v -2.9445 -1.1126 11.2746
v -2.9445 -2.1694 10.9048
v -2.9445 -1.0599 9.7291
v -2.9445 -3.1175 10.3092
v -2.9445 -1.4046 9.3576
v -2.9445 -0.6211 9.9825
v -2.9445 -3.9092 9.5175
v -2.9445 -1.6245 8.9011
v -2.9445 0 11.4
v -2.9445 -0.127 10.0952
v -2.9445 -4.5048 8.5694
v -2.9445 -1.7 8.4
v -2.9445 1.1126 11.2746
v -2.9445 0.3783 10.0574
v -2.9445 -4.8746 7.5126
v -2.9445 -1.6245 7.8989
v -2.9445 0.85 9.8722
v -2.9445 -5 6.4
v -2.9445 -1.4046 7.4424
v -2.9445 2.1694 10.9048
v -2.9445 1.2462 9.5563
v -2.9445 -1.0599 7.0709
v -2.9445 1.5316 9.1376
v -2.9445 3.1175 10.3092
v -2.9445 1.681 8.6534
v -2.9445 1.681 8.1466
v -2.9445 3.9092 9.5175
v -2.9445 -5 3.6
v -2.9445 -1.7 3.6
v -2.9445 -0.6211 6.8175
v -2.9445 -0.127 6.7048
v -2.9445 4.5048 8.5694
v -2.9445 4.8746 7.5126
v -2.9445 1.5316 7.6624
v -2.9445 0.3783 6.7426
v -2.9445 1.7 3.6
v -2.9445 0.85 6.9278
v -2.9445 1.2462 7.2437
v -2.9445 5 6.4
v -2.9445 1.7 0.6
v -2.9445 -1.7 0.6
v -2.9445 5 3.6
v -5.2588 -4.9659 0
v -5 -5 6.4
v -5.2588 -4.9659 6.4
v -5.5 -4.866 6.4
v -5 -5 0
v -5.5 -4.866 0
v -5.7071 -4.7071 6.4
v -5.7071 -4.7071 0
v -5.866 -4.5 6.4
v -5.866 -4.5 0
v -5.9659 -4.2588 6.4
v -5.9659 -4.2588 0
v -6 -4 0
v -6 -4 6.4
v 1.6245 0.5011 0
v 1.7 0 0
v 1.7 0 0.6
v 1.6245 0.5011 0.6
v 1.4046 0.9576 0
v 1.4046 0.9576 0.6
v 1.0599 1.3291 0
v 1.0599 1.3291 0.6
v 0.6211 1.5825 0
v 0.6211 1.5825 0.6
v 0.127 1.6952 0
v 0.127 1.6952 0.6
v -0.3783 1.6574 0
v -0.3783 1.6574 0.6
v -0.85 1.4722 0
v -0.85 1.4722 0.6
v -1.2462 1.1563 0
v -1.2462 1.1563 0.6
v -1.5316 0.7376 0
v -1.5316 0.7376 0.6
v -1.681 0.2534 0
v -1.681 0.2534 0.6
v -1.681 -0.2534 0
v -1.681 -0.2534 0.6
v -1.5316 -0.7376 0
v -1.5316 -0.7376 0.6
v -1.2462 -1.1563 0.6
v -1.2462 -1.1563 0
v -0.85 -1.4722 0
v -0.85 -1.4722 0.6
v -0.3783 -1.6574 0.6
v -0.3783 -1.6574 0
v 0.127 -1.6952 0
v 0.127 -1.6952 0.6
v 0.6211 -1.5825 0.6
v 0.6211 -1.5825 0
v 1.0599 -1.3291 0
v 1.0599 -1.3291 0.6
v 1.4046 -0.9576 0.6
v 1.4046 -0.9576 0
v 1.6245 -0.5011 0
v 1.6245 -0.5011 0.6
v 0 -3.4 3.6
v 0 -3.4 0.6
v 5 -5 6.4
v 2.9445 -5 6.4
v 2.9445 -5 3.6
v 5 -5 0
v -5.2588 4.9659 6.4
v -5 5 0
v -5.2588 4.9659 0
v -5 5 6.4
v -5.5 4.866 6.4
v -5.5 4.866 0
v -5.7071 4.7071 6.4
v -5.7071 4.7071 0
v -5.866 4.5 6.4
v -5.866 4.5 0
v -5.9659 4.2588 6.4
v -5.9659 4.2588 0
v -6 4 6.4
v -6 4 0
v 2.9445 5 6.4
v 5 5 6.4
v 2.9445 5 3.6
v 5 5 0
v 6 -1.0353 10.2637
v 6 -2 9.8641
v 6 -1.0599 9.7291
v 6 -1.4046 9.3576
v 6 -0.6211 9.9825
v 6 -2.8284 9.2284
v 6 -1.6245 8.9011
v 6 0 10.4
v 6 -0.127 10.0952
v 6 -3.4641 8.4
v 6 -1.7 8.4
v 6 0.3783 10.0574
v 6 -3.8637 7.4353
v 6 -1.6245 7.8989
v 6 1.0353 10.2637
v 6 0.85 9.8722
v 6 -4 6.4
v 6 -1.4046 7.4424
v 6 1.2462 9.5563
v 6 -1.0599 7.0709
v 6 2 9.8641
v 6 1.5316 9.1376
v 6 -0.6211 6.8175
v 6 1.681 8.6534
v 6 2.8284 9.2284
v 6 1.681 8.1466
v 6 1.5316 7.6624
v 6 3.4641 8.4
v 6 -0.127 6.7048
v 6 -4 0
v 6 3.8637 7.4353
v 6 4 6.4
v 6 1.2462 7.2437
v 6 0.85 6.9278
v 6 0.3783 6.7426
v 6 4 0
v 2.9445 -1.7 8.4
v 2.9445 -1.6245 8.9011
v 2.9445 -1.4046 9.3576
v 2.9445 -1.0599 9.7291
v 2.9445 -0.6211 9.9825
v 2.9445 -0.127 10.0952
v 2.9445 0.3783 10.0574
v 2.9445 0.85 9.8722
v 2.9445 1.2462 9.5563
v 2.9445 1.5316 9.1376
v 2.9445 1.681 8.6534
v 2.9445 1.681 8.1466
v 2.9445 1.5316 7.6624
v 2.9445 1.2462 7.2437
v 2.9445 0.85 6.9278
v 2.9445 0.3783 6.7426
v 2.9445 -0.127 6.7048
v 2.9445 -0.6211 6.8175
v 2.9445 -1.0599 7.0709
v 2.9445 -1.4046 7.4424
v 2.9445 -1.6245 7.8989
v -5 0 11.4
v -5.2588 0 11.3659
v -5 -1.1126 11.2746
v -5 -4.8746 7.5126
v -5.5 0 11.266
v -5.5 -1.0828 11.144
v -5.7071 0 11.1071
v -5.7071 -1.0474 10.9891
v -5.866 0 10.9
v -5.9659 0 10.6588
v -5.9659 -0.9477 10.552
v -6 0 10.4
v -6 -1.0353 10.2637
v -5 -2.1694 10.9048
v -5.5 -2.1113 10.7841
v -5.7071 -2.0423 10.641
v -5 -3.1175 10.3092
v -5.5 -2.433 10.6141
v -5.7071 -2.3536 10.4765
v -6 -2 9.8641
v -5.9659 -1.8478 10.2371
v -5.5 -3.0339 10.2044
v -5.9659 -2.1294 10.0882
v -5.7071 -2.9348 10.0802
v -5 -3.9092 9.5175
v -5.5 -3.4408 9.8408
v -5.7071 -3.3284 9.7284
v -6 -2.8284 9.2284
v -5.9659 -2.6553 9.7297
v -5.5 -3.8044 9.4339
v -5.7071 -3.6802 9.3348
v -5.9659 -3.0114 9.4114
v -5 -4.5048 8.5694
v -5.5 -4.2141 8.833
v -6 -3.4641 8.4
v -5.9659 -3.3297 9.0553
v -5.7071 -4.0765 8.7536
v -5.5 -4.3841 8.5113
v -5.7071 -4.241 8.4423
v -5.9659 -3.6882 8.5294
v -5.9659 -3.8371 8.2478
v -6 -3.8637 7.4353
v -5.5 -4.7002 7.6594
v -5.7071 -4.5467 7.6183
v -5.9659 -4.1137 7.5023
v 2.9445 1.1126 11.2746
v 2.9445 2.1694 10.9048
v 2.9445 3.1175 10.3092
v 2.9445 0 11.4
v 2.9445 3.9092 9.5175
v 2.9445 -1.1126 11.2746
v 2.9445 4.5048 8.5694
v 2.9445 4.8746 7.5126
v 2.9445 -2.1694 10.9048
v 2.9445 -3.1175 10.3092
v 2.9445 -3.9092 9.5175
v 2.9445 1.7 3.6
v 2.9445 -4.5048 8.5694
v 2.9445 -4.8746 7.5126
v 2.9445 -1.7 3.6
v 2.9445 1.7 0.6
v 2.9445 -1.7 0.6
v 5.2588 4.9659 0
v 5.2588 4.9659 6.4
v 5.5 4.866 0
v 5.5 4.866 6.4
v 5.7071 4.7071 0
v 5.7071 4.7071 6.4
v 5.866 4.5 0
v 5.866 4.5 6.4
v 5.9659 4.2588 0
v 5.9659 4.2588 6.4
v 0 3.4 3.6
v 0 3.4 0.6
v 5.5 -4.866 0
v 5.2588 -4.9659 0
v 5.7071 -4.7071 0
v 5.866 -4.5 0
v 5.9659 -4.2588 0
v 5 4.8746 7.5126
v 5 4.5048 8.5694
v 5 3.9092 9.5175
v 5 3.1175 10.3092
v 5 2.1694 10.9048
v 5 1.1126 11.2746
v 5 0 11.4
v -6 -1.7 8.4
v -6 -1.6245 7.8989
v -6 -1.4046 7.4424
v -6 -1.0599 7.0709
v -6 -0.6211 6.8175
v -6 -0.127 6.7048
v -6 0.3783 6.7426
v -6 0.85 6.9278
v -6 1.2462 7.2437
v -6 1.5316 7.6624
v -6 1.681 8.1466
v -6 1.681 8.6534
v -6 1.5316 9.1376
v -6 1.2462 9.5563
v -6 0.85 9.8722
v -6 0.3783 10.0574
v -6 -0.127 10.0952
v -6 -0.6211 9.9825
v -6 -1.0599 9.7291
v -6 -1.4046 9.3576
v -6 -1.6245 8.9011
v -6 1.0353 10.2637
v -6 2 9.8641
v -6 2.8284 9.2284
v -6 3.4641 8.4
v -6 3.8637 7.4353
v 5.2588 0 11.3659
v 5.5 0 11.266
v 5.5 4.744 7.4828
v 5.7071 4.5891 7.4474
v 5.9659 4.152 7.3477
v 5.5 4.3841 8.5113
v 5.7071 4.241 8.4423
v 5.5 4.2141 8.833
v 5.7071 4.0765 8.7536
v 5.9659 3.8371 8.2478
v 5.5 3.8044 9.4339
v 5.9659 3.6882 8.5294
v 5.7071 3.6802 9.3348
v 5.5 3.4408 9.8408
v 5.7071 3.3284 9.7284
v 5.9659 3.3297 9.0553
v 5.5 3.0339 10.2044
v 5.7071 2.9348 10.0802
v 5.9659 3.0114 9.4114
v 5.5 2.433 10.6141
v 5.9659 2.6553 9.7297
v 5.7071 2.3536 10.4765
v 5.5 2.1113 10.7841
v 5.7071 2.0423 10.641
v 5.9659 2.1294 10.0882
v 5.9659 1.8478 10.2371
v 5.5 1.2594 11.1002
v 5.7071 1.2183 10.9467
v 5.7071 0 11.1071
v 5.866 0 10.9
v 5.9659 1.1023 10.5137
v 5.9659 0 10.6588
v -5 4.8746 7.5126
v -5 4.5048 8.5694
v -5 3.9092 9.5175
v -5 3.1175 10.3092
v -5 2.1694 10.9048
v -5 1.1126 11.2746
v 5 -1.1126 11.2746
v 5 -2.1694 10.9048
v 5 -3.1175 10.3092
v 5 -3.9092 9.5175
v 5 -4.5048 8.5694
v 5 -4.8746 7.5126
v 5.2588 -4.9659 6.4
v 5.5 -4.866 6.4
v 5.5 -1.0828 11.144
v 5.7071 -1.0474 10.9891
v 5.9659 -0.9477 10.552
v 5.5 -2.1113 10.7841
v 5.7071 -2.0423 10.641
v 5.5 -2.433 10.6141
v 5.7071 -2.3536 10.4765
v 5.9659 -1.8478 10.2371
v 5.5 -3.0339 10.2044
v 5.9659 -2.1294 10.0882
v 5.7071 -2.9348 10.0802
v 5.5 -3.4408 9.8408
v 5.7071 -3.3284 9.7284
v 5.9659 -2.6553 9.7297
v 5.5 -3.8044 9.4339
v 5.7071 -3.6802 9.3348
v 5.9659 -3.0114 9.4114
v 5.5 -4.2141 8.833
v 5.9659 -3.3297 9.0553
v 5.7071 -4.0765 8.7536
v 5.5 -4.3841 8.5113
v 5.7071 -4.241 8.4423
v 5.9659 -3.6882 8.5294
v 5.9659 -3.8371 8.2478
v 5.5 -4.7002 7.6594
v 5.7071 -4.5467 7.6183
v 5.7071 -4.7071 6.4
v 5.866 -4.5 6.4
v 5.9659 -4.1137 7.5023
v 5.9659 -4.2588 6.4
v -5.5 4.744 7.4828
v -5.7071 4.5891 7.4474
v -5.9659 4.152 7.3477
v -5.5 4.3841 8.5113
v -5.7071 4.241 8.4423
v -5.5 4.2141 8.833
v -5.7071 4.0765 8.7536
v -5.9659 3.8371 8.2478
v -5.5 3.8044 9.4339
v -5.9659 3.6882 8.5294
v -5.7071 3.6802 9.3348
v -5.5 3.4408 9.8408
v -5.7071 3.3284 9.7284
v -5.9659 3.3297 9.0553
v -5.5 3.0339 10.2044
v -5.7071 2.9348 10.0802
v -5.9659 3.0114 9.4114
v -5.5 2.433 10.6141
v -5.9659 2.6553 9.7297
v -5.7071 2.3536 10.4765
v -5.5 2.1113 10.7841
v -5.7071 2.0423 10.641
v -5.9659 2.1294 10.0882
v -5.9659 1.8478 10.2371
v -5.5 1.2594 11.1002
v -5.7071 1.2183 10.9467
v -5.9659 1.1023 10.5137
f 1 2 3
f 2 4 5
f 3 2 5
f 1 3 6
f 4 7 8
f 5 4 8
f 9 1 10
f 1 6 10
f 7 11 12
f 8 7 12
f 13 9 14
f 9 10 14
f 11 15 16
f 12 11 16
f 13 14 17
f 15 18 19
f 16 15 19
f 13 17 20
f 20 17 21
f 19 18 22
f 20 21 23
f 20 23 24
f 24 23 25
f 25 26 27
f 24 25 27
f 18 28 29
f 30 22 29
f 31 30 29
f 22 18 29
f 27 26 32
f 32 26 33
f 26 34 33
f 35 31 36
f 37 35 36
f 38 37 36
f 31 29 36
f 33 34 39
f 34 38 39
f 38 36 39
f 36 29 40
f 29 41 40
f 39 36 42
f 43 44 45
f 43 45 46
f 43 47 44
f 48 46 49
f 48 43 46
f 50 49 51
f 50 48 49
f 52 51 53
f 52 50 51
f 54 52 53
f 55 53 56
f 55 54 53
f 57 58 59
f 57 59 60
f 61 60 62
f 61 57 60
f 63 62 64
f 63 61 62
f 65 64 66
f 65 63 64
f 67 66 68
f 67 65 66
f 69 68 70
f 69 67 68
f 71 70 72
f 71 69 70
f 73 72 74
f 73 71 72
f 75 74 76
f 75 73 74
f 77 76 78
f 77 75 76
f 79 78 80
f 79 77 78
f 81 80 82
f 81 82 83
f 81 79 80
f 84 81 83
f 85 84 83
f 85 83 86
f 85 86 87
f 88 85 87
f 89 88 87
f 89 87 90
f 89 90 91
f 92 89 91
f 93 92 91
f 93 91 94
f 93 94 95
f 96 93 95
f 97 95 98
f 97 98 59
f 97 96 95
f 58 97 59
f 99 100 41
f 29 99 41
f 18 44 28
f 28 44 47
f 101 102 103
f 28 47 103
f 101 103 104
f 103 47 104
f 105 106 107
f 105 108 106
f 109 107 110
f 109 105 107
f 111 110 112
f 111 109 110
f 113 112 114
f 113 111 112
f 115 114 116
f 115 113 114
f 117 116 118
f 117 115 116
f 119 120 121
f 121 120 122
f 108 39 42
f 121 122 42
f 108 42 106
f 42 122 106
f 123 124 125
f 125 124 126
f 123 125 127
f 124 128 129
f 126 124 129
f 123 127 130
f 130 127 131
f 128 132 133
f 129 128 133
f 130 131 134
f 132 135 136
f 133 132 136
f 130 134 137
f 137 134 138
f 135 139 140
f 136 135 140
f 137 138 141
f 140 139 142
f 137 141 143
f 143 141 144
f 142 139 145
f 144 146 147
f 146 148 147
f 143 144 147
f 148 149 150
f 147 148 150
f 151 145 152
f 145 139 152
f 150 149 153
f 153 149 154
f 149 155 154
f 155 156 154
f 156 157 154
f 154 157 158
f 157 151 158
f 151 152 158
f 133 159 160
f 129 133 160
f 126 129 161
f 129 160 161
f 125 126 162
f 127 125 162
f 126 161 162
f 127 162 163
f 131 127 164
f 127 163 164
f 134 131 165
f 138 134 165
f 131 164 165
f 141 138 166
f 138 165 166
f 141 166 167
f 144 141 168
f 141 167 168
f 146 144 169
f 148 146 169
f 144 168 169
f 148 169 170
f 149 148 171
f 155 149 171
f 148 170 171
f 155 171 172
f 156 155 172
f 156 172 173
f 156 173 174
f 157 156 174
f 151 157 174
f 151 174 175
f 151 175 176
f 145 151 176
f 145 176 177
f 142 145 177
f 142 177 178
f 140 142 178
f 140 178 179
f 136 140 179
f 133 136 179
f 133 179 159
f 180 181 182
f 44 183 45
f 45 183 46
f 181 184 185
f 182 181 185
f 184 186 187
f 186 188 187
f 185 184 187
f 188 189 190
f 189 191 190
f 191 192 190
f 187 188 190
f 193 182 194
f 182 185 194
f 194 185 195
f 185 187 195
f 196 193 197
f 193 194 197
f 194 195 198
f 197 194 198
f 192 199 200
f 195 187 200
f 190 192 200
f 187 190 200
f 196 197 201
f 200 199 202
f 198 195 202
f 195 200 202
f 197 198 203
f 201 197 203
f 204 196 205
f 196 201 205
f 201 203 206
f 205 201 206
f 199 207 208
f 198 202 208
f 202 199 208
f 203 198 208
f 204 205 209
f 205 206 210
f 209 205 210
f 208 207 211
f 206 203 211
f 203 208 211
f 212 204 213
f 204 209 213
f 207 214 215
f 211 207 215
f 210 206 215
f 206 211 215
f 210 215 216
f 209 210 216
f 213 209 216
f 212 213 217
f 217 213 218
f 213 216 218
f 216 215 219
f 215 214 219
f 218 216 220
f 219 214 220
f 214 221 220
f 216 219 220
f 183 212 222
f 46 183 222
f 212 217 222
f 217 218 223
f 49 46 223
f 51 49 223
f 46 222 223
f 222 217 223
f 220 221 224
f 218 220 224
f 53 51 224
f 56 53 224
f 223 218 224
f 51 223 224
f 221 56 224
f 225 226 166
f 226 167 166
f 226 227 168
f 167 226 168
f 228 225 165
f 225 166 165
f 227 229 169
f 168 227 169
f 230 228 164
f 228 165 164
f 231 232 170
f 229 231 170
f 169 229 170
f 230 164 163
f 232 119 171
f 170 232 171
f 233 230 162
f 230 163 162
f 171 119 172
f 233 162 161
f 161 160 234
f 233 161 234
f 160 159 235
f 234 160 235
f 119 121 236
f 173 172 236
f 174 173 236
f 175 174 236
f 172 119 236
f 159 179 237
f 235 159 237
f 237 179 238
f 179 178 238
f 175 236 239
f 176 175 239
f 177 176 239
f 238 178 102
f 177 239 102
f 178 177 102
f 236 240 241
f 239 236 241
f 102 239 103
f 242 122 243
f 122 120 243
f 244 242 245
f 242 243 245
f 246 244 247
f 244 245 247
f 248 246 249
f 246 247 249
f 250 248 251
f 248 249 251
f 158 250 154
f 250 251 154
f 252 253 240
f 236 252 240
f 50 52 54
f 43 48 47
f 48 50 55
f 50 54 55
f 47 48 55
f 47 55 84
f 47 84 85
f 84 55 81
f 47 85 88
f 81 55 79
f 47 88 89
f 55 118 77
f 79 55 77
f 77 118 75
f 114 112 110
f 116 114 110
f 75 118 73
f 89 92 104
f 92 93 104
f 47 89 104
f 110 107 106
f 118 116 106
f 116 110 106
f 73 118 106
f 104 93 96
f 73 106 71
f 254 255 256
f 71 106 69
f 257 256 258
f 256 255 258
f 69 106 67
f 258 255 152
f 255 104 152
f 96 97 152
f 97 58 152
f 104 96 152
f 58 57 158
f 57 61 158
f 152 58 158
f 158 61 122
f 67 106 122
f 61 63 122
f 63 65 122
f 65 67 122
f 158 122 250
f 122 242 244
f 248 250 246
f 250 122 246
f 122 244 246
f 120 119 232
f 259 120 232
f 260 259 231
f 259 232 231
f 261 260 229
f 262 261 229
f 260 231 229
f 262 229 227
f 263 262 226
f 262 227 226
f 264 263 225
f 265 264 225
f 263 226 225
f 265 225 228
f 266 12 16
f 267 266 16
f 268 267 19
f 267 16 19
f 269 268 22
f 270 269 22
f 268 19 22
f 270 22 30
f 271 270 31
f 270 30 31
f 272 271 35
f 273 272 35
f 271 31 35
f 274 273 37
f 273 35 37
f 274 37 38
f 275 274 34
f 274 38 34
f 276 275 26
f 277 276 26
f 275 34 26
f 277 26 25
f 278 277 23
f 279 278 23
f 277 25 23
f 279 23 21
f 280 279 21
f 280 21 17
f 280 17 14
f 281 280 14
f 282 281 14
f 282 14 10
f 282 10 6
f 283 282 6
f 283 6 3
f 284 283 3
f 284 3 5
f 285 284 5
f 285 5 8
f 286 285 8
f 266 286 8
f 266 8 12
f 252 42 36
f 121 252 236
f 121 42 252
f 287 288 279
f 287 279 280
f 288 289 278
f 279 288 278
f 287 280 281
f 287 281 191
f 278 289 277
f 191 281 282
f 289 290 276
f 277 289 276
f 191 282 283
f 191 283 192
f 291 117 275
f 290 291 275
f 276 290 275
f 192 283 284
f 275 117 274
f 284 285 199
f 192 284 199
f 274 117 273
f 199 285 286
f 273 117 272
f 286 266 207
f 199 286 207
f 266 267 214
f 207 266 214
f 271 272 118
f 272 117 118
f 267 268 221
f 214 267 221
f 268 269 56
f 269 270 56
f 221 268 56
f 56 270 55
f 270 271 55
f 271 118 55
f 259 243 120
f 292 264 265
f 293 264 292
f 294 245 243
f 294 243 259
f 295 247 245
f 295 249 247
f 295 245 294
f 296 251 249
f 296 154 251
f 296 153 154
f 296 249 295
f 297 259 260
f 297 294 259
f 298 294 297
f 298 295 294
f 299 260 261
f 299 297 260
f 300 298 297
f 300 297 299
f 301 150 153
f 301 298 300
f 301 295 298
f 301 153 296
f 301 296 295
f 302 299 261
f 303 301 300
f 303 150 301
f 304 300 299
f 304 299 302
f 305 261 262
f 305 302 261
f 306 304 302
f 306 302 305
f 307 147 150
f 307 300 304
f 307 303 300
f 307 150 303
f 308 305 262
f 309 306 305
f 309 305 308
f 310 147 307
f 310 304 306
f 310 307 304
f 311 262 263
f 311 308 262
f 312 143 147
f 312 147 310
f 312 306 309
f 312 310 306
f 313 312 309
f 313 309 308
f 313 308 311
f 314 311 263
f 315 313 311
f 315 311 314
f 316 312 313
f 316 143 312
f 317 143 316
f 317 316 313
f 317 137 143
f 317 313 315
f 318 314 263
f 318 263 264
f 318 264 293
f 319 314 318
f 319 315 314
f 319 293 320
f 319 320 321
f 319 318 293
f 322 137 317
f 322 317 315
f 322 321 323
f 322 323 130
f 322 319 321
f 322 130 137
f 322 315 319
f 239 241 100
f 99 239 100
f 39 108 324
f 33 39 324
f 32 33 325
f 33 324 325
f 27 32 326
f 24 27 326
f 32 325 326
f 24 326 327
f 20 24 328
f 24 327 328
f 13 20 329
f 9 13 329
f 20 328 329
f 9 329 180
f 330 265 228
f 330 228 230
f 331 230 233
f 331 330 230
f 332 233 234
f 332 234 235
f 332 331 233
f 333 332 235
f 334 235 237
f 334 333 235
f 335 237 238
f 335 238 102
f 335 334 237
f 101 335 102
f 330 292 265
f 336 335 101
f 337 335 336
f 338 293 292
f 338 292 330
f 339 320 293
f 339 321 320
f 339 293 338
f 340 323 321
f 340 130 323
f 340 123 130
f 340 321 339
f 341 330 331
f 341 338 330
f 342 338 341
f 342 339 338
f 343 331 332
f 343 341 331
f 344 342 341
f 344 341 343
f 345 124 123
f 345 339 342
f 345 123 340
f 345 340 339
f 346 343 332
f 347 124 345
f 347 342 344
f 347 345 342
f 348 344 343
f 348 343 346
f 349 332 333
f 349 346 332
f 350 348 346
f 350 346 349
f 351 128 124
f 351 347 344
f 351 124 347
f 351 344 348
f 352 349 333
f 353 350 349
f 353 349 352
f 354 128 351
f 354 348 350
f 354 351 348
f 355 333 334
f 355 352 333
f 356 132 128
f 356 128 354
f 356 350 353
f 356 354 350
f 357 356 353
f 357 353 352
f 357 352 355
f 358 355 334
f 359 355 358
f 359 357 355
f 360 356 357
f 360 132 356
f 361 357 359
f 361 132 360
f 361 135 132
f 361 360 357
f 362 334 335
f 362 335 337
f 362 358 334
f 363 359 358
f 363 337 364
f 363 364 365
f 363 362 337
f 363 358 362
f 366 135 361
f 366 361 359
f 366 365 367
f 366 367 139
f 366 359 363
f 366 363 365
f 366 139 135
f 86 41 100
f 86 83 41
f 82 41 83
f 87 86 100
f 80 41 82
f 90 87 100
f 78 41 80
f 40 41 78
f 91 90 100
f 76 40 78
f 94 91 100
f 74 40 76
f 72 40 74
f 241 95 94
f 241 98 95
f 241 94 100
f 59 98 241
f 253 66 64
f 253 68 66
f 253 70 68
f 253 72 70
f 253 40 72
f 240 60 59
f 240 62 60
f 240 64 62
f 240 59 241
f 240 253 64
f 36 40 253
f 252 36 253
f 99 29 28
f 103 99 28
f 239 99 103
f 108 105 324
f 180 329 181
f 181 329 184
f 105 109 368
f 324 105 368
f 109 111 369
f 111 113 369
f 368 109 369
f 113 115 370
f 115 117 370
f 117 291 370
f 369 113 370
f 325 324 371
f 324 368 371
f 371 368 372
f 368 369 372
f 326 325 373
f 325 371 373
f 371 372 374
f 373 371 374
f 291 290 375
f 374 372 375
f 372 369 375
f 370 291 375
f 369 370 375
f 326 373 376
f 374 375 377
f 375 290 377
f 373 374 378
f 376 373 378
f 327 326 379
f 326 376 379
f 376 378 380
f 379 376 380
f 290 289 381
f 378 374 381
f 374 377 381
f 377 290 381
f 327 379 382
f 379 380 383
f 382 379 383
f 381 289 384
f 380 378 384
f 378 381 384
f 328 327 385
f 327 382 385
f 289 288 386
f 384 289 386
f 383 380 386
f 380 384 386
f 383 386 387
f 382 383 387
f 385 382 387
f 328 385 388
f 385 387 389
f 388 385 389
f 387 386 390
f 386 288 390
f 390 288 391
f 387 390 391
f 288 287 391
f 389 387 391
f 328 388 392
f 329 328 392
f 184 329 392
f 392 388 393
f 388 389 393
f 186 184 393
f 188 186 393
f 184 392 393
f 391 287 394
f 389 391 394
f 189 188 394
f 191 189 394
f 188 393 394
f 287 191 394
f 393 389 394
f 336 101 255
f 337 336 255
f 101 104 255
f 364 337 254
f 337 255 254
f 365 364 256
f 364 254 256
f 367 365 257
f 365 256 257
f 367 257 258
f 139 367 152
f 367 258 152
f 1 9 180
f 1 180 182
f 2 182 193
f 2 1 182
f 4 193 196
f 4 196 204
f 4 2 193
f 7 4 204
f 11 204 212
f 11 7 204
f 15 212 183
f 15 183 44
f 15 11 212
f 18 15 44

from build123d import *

# Parameters (mm, degrees)
F0_R     = 1.7
F5_DEPTH = 0.6
F6_DEPTH = 3.6
F7_DEPTH = 11.4
F8_D     = 3.4
F8_DEPTH = 5
F8_START = 1
F8_TIP   = 1.0214630523
F9_D     = 3.4
F9_DEPTH = 5
F9_START = 1
F9_TIP   = 1.0214630523
F10_R    = 4.99999
F11_R    = 1


# Not quite as in the source:
# - a fillet or chamfer is up to 0.001 mm smaller than in the source, because OpenCascade refuses the exact size


with BuildPart() as f5:
    # F0 (on Top) → F5 (new body)
    with BuildSketch(Plane.XY):
        Polygon((0, 3.4), (-2.9444863729, 1.7), (-2.9444863729, -1.7), (0, -3.4), (2.9444863729, -1.7), (2.9444863729, 1.7), align=None)
        Circle(F0_R, mode=Mode.SUBTRACT)
    extrude(amount=F5_DEPTH)

    # F0 (on Top) → F6 (join)
    with BuildSketch(Plane.XY):
        Polygon((2.9444863729, 5), (-2.9444863729, 5), (-2.9444863729, 1.7), (0, 3.4), (2.9444863729, 1.7), align=None)
        Polygon((-2.9444863729, -1.7), (-2.9444863729, -5), (2.9444863729, -5), (2.9444863729, -1.7), (0, -3.4), align=None)
    extrude(amount=F6_DEPTH)

    # F0 (on Top) → F7 (join)
    with BuildSketch(Plane.XY):
        Polygon((-2.9444863729, 5), (-6, 5), (-6, -5), (-2.9444863729, -5), (-2.9444863729, -1.7), (-2.9444863729, 1.7), align=None)
        Polygon((6, 5), (2.9444863729, 5), (2.9444863729, 1.7), (2.9444863729, -1.7), (2.9444863729, -5), (6, -5), align=None)
    extrude(amount=F7_DEPTH)

    # F8
    # its depths count from where the whole tool has entered the part; down to there all is cleared
    with Locations(Plane(origin=(-7, 0, 0), x_dir=(0, 1, 0), z_dir=(-1, 0, 0)).offset(-F8_START)):
        with Locations((0, -8.4)):
            Hole(F8_D / 2, depth=F8_DEPTH)
            with Locations((0, 0, -(F8_DEPTH + F8_TIP / 2))):  # 118° drill point
                Cone(0, F8_D / 2, F8_TIP, mode=Mode.SUBTRACT)

    # F9
    # its depths count from where the whole tool has entered the part; down to there all is cleared
    with Locations(Plane.YZ.offset(7).offset(-F9_START)):
        with Locations((0, 8.4)):
            Hole(F9_D / 2, depth=F9_DEPTH)
            with Locations((0, 0, -(F9_DEPTH + F9_TIP / 2))):  # 118° drill point
                Cone(0, F9_D / 2, F9_TIP, mode=Mode.SUBTRACT)

    # F10 (radius 5 in the source; OpenCascade refuses exactly that, so slightly less here)
    f10_edges = [f5.edges().sort_by_distance(p)[0] for p in [
        (-4.472243, -5, 11.4),
        (-4.472243, 5, 11.4),
        (4.472243, 5, 11.4),
        (4.472243, -5, 11.4),
    ]]
    fillet(f10_edges, radius=F10_R)

    # F11
    f11_edges = [f5.edges().sort_by_distance(p)[0] for p in [
        (6, 3.535537, 9.935537),
        (-6, 3.535537, 9.935537),
    ]]
    fillet(f11_edges, radius=F11_R)


solid = f5.part
